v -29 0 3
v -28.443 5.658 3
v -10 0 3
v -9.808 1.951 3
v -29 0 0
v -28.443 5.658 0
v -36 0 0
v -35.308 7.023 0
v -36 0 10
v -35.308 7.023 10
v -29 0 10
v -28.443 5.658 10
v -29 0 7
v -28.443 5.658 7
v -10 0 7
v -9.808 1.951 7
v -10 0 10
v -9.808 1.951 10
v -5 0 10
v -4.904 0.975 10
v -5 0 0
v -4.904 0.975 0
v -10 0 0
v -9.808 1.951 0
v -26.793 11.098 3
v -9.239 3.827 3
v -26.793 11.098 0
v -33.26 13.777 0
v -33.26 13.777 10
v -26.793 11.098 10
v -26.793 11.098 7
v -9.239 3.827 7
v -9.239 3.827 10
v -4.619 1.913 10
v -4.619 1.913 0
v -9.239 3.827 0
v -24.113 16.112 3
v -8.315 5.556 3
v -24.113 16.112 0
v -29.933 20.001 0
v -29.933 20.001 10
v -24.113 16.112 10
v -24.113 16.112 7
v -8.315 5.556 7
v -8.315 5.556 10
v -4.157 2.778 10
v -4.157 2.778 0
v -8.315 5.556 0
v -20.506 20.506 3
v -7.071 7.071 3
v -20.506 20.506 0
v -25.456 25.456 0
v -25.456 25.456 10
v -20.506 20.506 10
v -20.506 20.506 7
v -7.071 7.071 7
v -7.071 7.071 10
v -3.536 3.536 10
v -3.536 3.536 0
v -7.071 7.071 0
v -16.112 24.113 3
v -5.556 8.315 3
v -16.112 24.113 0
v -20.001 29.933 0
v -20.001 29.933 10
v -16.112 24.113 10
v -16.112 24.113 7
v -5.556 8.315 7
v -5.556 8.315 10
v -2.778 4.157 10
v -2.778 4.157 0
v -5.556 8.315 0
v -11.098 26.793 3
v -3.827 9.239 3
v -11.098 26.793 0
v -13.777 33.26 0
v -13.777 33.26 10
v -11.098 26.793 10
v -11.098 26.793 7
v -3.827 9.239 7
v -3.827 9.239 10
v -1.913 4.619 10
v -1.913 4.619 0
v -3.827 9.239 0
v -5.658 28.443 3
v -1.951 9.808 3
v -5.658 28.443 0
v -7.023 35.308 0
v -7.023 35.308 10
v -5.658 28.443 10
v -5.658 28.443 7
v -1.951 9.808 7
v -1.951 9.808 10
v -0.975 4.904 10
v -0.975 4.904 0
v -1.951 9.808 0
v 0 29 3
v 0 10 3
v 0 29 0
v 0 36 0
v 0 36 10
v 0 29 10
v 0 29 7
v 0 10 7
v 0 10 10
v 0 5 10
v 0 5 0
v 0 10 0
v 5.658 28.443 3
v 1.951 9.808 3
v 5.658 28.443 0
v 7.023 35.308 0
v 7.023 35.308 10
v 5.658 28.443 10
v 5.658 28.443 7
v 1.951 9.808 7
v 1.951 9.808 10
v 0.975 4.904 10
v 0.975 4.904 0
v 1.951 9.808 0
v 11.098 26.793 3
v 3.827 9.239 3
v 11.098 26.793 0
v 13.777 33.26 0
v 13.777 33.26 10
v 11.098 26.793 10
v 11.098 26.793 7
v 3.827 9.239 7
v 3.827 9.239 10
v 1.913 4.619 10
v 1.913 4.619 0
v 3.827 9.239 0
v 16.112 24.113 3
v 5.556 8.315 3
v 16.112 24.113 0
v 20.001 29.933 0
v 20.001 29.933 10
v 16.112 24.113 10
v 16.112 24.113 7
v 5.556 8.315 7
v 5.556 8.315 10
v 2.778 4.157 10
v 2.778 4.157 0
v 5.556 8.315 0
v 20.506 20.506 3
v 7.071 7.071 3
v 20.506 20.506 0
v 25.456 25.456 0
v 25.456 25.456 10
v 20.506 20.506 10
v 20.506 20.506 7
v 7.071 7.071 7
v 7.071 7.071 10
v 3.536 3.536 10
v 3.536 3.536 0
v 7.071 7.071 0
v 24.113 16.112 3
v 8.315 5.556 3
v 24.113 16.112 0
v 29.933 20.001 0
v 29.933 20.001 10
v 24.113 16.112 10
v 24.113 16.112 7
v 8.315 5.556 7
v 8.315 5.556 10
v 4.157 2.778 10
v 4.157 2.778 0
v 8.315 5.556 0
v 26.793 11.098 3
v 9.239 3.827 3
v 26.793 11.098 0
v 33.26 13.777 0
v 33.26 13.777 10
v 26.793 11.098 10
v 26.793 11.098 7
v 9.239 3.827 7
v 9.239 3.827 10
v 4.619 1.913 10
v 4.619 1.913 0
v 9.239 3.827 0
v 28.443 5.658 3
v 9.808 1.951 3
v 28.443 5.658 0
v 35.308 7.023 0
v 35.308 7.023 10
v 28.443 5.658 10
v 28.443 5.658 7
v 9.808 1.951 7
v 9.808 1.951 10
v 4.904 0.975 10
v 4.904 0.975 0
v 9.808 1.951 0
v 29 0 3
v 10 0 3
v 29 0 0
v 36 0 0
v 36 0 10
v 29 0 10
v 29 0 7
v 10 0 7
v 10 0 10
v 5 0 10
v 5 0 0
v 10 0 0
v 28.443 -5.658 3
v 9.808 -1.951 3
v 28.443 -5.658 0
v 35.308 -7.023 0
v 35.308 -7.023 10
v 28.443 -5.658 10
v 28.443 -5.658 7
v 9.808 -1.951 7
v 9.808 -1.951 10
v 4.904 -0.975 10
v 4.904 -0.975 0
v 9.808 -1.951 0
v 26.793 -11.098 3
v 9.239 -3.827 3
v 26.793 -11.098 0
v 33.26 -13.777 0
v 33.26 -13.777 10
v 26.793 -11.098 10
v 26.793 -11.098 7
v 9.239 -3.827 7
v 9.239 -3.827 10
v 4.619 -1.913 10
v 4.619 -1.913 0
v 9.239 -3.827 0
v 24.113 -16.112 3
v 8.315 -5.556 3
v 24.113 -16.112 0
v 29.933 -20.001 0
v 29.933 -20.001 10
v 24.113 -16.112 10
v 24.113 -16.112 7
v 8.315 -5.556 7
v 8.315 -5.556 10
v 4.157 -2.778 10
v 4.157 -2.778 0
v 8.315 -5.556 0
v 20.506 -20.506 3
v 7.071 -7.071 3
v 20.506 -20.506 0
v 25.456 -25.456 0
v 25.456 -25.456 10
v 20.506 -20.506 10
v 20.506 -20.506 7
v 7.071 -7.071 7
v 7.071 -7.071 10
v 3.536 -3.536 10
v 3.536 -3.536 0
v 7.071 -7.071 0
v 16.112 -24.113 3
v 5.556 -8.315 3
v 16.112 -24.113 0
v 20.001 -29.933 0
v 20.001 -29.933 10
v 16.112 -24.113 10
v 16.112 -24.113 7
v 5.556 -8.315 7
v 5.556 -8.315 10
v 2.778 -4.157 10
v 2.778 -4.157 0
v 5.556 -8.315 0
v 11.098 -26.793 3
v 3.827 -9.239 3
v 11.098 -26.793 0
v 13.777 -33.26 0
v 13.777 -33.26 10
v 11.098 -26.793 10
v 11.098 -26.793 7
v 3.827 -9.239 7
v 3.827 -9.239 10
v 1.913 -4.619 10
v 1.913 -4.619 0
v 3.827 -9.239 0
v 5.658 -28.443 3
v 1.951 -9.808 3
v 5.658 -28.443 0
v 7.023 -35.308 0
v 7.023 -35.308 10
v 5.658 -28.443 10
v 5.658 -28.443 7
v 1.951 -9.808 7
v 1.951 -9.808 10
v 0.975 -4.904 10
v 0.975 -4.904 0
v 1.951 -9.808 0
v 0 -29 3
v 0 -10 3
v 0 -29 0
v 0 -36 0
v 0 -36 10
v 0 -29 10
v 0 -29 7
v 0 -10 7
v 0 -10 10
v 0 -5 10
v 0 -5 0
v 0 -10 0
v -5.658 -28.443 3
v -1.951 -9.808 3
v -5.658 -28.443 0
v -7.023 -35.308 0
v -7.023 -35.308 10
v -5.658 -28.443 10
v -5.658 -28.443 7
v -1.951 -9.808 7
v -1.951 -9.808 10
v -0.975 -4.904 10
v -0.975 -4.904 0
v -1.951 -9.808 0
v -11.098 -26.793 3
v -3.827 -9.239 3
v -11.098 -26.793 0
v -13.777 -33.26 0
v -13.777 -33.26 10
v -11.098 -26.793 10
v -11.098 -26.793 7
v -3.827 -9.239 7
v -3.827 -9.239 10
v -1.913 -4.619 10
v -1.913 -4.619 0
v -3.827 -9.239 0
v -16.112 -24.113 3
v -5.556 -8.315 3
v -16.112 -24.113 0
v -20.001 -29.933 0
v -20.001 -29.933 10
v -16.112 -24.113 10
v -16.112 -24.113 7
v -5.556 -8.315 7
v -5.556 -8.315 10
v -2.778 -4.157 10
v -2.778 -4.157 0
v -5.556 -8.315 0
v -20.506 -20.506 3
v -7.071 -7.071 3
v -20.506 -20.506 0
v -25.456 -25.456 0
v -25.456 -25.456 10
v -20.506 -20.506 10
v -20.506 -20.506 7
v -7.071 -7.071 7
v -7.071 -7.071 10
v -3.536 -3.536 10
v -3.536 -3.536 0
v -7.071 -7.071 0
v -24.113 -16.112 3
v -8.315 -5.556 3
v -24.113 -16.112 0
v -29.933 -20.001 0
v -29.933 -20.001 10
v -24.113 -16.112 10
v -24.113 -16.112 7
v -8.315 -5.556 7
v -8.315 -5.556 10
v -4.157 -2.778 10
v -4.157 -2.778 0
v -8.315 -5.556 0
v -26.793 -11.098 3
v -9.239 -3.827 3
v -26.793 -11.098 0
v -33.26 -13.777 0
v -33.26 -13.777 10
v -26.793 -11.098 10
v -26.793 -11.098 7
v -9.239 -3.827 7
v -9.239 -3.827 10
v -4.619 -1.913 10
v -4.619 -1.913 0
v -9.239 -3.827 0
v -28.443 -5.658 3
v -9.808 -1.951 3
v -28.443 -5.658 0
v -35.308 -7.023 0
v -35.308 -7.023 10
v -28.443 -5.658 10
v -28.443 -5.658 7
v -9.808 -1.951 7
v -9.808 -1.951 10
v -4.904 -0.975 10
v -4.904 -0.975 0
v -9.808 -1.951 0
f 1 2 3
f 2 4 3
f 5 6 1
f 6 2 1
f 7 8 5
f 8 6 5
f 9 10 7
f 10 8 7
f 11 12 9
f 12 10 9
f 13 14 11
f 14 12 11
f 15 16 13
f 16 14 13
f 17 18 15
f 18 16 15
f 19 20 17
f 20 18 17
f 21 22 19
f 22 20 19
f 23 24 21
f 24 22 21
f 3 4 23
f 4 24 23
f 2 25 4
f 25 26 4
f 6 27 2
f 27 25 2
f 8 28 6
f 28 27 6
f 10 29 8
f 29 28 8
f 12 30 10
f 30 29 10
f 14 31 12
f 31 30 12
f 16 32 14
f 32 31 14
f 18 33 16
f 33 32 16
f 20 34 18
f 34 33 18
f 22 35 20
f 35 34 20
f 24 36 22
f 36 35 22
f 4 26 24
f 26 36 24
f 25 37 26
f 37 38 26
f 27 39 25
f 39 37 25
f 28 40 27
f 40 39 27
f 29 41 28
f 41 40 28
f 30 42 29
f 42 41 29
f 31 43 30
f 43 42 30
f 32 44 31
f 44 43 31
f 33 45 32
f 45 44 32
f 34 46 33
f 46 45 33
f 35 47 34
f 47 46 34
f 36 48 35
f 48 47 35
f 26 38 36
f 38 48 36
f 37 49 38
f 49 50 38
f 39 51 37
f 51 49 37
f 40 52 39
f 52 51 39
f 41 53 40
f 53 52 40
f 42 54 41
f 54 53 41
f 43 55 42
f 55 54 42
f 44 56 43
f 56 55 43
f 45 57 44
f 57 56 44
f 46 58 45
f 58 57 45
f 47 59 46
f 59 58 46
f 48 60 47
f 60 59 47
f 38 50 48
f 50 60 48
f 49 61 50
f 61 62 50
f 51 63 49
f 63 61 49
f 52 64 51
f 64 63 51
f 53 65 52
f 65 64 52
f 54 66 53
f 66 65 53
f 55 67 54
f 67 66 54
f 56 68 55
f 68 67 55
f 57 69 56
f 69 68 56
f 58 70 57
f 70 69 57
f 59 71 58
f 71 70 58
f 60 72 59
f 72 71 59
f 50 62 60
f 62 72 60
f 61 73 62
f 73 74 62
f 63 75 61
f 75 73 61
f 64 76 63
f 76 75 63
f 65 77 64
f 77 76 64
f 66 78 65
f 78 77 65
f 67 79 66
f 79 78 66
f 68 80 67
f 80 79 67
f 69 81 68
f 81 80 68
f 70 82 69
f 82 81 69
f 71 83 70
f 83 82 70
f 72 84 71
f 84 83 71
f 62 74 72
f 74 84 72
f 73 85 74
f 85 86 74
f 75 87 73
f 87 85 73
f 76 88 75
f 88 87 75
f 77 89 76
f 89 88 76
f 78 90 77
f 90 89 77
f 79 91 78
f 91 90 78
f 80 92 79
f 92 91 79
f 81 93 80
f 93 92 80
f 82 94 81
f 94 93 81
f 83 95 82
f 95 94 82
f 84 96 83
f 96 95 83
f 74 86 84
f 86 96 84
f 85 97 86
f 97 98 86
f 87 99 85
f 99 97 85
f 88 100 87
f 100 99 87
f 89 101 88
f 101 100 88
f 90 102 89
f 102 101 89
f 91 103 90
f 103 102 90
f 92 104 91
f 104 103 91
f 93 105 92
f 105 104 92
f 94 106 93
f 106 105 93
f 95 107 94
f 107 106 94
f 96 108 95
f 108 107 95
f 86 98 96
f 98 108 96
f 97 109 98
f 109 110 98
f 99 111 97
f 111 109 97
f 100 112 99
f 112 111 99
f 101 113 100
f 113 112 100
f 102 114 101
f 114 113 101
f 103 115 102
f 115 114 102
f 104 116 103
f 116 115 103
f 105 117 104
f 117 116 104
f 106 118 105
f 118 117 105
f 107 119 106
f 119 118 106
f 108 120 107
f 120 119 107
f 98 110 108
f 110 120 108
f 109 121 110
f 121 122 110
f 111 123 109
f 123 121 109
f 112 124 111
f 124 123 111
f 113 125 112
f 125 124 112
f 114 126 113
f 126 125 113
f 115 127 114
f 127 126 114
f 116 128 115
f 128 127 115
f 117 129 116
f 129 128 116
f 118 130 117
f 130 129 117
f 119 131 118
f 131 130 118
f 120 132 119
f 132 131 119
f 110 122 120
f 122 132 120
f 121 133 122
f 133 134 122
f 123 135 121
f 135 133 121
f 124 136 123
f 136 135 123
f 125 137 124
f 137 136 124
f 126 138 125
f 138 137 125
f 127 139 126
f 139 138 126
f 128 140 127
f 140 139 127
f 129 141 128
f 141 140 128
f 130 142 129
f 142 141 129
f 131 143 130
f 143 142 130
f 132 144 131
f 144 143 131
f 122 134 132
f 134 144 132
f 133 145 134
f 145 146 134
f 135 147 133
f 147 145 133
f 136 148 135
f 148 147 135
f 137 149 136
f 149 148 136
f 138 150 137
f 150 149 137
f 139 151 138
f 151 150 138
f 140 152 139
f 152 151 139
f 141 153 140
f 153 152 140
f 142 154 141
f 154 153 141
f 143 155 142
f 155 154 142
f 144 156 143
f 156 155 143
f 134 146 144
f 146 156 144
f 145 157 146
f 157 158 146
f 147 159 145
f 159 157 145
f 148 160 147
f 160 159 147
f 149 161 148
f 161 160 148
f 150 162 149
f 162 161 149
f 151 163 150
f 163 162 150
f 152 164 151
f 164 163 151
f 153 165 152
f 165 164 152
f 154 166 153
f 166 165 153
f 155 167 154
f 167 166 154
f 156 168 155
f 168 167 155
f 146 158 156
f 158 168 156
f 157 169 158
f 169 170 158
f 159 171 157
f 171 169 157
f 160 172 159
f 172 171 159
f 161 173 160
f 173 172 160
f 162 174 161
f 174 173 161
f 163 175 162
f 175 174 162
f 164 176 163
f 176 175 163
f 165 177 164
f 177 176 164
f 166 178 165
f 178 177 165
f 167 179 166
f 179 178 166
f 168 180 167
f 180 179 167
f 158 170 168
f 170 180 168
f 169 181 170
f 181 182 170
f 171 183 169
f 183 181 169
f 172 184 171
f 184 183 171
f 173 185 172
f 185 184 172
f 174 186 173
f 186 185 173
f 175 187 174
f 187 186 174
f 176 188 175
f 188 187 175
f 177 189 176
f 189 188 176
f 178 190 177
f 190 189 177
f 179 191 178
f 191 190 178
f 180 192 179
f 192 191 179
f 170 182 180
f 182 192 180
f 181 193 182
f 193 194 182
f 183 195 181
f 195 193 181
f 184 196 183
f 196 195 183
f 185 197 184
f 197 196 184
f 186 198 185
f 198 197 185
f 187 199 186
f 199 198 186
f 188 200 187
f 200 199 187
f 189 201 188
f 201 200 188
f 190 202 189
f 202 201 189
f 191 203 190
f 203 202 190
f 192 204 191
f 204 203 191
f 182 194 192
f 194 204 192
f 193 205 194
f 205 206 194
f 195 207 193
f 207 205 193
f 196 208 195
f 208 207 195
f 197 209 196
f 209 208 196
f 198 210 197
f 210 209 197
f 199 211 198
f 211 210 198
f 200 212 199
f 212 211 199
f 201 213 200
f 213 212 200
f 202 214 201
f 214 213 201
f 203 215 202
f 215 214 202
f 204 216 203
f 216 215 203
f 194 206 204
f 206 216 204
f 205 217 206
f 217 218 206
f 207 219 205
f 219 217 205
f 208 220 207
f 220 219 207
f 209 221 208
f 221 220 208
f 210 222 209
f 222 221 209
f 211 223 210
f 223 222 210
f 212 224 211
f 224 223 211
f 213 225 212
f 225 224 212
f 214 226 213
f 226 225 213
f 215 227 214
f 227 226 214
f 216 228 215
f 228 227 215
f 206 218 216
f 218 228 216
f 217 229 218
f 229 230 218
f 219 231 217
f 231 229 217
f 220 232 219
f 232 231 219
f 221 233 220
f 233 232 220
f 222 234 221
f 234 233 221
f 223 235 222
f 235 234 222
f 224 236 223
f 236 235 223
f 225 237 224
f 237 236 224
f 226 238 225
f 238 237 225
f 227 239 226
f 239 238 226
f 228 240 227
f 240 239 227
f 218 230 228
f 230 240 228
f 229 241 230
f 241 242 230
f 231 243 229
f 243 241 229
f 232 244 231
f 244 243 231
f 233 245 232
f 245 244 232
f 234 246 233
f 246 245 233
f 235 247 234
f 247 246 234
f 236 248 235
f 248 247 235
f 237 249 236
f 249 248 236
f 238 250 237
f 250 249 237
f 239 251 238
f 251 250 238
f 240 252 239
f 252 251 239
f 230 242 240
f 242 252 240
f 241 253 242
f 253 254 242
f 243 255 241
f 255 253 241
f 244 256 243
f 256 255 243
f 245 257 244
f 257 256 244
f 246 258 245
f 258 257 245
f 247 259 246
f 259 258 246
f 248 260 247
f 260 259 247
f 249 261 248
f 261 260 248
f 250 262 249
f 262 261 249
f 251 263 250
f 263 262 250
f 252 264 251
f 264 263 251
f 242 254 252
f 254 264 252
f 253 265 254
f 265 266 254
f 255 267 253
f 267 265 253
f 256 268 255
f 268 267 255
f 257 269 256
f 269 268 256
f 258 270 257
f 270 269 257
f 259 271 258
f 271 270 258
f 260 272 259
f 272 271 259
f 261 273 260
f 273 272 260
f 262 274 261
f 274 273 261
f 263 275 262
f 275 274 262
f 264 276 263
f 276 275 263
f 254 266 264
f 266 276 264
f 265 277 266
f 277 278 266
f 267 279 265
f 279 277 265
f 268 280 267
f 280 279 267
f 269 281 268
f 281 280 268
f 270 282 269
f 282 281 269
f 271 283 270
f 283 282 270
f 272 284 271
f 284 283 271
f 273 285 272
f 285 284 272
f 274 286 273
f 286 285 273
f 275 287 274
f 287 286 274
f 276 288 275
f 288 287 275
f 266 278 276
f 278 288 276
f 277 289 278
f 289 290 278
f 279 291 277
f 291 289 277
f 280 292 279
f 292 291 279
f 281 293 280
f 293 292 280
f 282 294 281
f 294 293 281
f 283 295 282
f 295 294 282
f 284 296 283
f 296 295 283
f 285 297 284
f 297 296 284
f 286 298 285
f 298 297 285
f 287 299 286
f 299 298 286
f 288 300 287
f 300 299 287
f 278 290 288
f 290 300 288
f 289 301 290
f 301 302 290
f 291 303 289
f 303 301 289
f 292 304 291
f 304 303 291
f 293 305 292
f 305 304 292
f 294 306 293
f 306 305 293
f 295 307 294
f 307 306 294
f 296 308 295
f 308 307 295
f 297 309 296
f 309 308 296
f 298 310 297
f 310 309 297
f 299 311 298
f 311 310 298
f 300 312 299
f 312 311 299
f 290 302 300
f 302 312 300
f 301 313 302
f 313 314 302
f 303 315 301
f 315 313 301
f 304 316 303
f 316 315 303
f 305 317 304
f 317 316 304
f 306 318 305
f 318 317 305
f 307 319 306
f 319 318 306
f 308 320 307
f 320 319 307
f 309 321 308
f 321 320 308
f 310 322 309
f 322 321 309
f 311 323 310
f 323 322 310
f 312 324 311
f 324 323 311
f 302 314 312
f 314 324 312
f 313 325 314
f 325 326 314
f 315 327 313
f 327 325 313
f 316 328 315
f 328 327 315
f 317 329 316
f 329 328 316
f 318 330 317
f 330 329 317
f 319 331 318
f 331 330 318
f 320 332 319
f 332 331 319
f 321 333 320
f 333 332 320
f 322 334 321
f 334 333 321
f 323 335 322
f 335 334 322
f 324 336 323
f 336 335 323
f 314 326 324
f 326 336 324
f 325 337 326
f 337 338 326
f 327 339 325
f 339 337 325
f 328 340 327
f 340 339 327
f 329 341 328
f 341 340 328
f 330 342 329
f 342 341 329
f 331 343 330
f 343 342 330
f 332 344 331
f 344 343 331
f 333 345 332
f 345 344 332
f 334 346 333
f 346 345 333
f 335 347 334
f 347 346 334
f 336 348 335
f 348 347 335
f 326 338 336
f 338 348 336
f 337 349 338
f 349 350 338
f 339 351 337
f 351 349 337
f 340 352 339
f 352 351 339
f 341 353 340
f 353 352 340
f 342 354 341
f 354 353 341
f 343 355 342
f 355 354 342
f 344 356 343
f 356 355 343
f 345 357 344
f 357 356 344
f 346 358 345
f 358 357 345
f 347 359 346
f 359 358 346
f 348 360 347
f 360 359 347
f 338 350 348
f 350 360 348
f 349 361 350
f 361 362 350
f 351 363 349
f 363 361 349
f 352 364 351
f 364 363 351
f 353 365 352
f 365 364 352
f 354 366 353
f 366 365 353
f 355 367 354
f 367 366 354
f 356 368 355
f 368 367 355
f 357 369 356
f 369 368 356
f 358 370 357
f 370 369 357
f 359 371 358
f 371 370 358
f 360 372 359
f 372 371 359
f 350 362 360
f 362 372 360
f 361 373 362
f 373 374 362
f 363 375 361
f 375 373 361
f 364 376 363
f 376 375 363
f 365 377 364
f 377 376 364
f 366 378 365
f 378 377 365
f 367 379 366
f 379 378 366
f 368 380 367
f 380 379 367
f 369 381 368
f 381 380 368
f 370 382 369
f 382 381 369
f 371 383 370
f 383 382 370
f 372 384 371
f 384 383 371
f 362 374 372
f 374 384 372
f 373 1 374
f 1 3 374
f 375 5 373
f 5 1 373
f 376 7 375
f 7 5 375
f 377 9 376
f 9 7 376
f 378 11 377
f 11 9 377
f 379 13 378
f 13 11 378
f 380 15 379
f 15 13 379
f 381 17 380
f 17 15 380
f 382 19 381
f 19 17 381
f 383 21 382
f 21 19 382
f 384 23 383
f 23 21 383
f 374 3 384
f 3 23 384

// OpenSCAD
$fn = 32;

// ----------------------------------------------------------------------
// Revolved part: handwheel R36
// ----------------------------------------------------------------------

// --- parameters (mm) ---
bore_r = 5;               // bore radius
rim_r = 36;               // rim radius
rim_w = 7;                // rim axial width
rim_t = 10;               // rim diameter height
hub_r = 10;               // hub radius
web_t = 4;                // web thickness
revolve_angle = 360;      // revolve sweep, degrees

bore_d = 2 * bore_r;
rim_d = 2 * rim_r;
hub_d = 2 * hub_r;

profile = [[5, 0], [10, 0], [10, 3], [29, 3], [29, 0], [36, 0], [36, 10], [29, 10], [29, 7], [10, 7], [10, 10], [5, 10]];  // primary outline, 12 points, counter clockwise

// --- the one profile operation ---
rotate_extrude(angle = revolve_angle) polygon(points = profile);
